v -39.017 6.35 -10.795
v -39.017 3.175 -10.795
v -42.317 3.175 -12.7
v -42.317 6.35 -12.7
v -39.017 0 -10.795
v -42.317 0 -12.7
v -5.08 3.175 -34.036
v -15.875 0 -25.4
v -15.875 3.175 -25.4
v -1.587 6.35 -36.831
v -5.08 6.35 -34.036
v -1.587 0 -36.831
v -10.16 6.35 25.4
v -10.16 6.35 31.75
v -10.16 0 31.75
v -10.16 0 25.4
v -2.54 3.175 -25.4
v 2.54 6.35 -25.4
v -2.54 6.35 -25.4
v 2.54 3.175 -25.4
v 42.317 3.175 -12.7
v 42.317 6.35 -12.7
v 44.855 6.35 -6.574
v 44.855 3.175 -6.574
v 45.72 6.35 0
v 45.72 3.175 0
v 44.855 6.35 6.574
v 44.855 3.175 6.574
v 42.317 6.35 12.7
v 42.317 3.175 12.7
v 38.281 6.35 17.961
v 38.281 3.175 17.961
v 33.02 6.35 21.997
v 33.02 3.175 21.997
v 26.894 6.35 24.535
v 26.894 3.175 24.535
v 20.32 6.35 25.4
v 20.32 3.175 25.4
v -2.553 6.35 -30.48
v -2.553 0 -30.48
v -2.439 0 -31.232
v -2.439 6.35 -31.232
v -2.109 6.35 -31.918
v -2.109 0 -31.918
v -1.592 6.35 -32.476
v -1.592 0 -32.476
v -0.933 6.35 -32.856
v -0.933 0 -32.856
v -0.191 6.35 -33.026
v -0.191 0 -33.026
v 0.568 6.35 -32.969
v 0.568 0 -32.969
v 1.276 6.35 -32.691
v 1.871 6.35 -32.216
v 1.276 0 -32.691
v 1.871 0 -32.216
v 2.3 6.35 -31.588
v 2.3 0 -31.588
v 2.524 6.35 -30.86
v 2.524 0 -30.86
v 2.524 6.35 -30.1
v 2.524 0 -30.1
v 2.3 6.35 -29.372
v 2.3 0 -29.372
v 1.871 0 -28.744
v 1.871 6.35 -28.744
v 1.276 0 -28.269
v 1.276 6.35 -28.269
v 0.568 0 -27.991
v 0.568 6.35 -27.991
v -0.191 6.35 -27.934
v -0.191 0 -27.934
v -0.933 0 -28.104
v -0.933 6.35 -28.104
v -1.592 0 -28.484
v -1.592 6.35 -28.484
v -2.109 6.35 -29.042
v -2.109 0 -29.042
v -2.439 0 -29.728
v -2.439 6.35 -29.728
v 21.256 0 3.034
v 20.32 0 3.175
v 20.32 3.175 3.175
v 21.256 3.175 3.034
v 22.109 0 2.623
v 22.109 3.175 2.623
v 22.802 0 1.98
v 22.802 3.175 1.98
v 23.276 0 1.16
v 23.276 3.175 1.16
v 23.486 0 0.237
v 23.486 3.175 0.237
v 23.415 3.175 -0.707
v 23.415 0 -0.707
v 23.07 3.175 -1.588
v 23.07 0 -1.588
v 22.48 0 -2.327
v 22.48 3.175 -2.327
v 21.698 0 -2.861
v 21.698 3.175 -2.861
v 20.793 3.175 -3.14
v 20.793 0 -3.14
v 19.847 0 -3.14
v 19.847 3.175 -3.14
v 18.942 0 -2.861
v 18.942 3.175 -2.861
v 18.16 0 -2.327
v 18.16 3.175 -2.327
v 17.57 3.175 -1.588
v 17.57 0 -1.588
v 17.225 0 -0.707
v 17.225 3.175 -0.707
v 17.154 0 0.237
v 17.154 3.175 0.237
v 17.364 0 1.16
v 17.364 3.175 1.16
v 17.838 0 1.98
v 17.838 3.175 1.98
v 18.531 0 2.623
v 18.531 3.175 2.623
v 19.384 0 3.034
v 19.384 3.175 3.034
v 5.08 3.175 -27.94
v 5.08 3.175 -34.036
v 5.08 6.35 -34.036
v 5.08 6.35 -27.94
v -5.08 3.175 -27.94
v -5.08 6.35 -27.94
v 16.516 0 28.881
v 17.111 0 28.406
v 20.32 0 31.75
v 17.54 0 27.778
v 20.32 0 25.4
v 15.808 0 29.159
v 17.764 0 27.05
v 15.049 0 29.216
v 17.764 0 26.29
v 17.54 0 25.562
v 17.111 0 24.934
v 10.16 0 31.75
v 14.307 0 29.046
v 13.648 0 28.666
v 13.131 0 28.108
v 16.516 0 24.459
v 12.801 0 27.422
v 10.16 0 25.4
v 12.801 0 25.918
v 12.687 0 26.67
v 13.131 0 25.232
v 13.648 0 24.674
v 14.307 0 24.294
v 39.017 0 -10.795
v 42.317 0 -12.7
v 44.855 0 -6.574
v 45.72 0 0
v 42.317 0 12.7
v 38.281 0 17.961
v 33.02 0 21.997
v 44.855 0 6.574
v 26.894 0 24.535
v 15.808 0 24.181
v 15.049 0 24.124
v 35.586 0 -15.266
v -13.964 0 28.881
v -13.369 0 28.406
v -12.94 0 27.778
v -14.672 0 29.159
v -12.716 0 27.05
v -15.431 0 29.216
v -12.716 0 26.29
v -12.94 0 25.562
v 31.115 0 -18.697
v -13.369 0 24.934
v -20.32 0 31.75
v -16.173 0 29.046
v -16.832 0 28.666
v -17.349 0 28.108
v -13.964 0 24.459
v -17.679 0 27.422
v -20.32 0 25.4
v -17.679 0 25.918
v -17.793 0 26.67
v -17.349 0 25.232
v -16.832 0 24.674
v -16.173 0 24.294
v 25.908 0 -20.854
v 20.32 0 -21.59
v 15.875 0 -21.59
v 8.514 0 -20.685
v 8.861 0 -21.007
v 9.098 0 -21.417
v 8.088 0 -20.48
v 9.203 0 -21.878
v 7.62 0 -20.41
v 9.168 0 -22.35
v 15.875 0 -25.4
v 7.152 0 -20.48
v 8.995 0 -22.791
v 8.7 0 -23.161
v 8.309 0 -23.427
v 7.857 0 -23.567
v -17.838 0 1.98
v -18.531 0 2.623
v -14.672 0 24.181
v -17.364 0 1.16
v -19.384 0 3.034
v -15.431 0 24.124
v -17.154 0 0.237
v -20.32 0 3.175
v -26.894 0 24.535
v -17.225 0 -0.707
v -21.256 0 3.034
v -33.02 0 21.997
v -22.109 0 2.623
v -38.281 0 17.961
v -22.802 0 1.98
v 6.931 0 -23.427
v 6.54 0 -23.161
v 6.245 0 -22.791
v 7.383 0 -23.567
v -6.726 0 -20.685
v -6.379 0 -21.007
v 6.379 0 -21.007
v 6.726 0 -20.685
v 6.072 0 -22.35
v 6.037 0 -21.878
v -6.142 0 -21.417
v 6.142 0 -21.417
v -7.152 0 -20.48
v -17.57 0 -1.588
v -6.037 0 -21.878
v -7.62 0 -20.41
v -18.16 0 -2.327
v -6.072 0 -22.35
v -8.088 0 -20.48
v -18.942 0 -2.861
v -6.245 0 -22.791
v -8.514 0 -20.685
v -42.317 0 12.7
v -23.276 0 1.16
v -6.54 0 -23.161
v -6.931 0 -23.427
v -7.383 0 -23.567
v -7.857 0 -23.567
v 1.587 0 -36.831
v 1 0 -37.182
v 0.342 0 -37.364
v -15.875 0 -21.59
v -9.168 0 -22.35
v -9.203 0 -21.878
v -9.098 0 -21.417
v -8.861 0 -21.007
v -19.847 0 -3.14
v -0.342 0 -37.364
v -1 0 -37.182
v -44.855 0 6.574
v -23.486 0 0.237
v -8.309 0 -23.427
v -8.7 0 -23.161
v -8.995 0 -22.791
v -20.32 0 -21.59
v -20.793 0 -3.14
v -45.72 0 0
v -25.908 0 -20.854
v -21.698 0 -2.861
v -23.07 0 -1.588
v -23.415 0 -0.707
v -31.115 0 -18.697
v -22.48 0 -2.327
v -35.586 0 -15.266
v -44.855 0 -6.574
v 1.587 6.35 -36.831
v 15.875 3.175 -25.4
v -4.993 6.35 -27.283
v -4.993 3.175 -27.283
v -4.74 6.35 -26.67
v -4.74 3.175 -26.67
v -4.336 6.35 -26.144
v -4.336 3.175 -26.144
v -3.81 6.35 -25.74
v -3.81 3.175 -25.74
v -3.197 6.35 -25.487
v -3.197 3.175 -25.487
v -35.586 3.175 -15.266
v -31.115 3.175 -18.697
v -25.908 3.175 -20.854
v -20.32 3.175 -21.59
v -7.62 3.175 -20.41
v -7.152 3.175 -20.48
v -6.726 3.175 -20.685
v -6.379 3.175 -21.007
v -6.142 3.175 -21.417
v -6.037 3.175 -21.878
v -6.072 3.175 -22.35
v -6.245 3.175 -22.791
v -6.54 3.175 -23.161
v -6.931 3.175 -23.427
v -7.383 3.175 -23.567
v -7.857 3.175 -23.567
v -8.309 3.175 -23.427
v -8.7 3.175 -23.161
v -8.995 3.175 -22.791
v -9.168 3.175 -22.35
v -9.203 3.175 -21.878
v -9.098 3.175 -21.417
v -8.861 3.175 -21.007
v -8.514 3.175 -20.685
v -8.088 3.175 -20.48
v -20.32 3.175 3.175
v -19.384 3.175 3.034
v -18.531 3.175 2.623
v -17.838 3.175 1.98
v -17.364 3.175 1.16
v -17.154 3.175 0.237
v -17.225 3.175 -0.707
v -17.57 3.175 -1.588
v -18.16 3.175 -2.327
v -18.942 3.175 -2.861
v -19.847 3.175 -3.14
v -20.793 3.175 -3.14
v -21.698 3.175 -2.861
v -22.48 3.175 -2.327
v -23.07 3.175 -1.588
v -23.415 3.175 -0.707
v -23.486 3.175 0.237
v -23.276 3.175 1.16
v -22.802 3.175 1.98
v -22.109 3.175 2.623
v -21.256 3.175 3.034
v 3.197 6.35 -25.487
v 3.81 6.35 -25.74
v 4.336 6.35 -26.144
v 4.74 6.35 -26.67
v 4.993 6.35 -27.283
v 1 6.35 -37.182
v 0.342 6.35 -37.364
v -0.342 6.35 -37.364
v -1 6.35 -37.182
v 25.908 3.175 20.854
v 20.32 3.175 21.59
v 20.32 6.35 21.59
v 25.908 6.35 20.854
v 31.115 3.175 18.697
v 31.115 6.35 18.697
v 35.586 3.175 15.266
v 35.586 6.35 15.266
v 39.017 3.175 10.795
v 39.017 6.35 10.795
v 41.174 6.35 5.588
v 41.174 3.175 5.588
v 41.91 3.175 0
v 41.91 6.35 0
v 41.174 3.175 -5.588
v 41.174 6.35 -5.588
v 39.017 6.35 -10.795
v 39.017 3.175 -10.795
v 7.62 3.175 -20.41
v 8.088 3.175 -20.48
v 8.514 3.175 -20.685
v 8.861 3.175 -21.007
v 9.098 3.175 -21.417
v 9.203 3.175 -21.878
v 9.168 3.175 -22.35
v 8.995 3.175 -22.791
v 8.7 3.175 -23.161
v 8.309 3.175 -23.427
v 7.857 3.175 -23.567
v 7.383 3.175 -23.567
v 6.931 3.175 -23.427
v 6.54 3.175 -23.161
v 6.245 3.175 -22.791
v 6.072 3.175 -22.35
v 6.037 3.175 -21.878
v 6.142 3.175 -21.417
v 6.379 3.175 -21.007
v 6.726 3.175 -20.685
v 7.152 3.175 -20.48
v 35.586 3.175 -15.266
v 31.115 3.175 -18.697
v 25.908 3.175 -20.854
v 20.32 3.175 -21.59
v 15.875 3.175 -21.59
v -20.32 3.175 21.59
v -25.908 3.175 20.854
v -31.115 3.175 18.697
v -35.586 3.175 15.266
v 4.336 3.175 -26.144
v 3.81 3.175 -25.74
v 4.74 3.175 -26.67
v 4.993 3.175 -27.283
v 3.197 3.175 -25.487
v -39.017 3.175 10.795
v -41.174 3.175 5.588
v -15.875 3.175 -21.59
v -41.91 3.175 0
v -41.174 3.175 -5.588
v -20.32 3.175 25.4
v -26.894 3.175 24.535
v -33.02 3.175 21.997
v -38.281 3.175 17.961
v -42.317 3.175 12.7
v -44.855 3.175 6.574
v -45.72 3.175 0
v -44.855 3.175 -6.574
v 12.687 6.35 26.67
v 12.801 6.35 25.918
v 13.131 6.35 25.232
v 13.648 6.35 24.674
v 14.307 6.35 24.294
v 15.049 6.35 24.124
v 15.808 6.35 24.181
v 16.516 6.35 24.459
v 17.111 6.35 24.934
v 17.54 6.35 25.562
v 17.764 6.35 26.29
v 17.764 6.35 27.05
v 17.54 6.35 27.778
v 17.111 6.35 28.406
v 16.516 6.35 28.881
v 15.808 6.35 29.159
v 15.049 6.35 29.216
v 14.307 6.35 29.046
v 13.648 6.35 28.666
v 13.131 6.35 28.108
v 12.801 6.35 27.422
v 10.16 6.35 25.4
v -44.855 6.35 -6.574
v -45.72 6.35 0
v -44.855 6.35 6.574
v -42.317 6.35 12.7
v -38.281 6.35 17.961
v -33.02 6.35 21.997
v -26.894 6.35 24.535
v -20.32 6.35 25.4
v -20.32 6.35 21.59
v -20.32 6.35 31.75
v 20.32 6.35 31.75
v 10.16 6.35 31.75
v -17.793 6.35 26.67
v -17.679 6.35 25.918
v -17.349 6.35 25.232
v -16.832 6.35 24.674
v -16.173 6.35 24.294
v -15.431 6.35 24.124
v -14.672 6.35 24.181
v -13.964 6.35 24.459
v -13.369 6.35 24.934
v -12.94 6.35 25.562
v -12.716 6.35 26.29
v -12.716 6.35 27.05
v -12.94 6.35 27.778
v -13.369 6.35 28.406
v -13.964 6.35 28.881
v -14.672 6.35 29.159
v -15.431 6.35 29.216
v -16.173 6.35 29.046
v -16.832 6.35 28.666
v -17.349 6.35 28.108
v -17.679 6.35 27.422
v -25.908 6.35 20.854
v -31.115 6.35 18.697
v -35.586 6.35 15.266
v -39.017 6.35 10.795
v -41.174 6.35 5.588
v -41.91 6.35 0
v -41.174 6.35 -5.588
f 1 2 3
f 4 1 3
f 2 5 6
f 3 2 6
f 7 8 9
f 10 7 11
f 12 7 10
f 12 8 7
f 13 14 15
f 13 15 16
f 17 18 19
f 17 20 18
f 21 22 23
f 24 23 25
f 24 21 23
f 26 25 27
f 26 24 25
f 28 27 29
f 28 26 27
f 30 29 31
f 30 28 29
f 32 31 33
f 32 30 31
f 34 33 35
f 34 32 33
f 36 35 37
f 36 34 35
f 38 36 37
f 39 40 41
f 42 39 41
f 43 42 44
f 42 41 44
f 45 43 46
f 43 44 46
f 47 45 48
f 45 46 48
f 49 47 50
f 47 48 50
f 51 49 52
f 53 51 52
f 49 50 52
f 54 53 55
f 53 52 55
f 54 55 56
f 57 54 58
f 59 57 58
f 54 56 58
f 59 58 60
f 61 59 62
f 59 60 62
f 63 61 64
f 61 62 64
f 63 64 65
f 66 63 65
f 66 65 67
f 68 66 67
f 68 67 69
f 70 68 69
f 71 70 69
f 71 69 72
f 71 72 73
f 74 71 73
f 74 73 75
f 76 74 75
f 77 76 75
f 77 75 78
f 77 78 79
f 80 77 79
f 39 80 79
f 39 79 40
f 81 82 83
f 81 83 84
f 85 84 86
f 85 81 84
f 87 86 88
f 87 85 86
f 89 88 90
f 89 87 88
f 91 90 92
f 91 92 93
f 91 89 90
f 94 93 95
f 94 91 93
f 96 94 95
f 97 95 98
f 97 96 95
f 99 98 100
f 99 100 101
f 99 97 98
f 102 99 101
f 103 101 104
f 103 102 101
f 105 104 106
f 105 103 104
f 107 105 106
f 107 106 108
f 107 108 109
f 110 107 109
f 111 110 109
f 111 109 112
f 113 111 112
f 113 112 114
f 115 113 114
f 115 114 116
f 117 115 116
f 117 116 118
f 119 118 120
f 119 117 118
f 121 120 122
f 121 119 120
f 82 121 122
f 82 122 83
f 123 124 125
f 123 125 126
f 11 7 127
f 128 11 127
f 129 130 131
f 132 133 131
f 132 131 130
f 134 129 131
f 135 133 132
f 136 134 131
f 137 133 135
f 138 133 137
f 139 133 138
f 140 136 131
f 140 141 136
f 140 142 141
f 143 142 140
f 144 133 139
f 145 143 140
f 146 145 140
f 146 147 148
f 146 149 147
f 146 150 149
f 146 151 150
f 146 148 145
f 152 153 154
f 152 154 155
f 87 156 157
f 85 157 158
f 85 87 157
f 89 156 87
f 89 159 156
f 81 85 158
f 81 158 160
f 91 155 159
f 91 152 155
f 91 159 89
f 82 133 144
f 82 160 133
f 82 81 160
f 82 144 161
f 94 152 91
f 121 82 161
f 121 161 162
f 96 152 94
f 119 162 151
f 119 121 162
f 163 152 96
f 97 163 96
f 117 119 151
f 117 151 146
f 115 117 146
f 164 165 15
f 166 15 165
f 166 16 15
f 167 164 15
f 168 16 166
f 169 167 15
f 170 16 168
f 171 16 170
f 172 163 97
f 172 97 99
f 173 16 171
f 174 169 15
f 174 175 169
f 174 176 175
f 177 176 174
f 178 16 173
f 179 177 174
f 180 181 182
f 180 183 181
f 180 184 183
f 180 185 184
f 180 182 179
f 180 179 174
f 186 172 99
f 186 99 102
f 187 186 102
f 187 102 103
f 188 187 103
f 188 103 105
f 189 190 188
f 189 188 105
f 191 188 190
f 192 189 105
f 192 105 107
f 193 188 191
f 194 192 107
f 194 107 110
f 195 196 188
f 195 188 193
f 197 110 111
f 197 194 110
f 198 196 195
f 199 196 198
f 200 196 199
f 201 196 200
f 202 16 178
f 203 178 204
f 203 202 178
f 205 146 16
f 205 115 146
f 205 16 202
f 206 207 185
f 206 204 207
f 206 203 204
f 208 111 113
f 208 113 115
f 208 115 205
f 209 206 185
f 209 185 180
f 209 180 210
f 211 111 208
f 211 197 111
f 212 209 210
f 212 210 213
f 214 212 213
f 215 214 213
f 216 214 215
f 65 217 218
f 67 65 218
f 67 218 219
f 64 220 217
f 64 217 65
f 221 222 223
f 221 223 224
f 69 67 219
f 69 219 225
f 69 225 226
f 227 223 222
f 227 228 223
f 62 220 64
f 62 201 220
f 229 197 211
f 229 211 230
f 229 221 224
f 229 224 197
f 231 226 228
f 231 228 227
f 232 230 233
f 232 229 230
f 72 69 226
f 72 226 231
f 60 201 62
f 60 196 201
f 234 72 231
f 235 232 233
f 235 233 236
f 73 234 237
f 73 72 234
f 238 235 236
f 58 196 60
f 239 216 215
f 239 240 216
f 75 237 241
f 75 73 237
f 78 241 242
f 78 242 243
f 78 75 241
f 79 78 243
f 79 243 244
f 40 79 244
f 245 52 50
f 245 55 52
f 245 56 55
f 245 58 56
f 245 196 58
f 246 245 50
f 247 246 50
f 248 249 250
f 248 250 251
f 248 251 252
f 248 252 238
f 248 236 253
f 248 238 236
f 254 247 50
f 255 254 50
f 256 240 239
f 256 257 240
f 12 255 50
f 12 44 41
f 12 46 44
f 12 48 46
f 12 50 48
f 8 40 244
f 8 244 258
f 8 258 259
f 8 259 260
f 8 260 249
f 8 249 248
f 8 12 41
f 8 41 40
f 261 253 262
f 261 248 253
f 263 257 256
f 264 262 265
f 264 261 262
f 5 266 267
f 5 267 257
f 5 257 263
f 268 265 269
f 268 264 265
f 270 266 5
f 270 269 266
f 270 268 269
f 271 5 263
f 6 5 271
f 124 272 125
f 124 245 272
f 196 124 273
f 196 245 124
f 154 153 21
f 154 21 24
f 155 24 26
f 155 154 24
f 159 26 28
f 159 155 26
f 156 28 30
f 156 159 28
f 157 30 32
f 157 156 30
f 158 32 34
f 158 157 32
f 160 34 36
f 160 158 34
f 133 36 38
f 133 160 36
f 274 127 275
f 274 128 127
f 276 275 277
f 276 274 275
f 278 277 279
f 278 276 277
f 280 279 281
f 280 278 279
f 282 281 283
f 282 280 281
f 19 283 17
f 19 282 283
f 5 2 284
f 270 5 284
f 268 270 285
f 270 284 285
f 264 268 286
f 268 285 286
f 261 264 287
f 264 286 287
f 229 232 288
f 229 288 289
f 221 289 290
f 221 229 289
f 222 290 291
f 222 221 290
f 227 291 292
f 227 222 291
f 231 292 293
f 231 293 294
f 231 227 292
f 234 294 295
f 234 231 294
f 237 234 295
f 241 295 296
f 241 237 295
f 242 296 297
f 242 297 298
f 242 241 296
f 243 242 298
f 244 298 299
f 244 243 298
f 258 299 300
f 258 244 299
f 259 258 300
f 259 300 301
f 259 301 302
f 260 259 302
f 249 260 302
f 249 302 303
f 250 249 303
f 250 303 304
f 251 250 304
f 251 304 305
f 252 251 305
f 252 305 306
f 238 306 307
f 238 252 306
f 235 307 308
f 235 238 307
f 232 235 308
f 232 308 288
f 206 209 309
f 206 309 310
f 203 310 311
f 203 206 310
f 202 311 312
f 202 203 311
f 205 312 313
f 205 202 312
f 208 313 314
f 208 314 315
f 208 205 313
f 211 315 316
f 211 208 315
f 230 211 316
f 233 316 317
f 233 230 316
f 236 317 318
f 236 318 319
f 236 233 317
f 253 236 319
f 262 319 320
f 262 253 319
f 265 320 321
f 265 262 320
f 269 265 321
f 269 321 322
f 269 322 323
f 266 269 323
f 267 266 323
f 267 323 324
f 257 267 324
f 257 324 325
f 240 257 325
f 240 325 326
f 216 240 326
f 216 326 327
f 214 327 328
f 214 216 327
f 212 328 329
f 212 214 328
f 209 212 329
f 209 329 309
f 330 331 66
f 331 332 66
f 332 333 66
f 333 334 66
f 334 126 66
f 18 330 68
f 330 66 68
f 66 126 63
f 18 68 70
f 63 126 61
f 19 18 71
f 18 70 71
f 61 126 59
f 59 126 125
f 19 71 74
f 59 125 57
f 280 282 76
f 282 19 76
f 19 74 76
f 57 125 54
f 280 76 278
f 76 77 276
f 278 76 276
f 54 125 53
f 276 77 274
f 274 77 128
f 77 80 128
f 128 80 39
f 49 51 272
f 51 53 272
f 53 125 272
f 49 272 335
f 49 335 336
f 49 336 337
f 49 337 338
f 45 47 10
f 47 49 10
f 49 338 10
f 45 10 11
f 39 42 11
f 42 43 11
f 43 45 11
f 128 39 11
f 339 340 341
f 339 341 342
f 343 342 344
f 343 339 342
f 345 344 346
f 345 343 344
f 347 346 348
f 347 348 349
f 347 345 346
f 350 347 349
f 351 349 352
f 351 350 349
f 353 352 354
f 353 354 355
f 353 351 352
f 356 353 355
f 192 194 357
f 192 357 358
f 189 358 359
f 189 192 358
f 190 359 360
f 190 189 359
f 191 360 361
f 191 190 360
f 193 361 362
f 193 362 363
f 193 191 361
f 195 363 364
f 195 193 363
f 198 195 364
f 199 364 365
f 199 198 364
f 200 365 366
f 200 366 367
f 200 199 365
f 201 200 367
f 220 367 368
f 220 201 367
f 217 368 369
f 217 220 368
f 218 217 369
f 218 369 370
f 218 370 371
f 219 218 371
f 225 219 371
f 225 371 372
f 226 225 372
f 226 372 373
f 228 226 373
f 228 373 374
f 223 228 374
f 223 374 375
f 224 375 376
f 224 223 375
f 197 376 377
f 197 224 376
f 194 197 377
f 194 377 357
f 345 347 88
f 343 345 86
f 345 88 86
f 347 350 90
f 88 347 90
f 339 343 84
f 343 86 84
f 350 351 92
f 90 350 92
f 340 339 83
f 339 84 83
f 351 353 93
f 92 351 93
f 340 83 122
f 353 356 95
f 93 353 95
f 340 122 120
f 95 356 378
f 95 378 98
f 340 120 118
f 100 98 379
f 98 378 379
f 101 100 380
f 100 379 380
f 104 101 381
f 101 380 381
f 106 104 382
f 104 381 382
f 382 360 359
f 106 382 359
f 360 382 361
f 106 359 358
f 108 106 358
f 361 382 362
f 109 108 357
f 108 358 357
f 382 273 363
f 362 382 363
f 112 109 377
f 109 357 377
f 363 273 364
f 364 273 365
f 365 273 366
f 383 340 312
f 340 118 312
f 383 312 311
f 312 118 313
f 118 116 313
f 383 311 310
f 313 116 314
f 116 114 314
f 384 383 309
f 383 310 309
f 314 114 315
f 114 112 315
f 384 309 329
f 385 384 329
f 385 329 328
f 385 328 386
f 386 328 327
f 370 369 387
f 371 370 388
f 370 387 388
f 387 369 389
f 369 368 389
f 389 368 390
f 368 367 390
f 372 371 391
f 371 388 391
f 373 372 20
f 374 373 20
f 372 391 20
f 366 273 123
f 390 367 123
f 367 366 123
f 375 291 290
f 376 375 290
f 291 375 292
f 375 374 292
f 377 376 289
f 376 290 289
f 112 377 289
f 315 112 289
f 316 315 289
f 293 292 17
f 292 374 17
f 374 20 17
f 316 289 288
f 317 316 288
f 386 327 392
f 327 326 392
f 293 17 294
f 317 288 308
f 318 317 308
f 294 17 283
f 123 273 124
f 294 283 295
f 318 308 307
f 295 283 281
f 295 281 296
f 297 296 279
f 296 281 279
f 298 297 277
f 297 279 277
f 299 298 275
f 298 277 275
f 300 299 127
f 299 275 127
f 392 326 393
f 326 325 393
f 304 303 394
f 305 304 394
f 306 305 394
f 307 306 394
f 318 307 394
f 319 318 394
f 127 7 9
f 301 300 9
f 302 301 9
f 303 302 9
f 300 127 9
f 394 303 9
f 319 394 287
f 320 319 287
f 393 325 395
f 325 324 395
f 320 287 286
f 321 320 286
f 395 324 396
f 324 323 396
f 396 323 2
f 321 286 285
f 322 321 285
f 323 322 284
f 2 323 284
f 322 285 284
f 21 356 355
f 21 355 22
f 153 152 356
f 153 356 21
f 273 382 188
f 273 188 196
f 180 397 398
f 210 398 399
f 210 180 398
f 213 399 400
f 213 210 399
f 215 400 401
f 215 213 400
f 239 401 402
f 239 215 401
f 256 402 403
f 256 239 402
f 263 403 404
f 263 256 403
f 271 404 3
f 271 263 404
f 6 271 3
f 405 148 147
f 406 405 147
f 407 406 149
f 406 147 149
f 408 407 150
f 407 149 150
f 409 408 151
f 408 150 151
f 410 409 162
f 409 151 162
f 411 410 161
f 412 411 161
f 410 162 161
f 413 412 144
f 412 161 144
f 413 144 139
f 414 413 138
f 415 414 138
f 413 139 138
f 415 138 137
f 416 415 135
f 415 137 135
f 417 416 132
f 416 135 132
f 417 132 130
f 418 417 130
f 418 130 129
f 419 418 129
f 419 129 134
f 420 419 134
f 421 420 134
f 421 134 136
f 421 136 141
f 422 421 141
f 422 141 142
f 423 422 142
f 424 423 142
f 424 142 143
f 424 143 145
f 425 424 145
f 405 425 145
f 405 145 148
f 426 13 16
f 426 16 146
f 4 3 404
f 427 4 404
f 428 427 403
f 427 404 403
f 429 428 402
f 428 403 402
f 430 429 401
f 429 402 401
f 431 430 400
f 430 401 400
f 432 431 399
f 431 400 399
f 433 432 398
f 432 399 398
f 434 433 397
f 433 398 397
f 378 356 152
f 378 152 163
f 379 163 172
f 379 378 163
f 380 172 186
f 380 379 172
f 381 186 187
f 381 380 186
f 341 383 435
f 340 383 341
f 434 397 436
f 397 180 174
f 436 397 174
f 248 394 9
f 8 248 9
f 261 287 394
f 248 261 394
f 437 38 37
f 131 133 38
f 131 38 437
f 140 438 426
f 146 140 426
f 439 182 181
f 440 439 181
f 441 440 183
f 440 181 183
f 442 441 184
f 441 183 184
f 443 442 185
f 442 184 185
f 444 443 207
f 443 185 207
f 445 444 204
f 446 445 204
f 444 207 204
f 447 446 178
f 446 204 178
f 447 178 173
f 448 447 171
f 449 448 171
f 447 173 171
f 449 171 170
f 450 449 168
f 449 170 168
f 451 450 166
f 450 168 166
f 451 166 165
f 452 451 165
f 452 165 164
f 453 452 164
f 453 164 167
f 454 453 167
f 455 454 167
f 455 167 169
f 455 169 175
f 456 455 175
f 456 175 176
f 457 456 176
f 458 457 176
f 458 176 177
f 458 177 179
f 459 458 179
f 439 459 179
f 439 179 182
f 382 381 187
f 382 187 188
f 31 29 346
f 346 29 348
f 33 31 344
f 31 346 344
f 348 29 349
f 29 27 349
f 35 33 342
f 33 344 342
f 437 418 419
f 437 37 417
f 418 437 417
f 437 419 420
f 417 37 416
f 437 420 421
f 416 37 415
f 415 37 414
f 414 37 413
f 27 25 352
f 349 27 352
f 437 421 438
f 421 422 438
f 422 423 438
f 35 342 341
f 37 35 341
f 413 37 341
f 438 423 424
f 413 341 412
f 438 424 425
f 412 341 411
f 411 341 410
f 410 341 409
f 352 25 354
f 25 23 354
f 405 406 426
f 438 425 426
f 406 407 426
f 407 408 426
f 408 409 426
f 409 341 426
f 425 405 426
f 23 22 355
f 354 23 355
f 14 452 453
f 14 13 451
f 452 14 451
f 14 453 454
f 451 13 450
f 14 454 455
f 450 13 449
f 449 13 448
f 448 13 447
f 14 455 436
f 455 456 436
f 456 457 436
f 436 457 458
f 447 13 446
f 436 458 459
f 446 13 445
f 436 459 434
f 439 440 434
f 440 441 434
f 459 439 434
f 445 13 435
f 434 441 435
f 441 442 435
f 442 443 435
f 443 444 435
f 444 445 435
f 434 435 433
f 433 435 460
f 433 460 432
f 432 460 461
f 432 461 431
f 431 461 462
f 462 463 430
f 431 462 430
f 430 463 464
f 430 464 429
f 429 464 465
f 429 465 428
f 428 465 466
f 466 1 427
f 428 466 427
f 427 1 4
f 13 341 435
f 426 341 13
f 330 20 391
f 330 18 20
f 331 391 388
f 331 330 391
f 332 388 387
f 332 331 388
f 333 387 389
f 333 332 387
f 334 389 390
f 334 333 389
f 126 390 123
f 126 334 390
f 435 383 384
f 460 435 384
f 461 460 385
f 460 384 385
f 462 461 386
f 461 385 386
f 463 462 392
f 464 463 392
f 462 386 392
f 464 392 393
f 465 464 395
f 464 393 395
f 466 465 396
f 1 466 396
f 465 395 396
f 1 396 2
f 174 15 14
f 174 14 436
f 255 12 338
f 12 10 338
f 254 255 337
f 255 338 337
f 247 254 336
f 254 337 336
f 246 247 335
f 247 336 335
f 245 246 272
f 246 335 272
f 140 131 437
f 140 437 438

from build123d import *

# Parameters (mm, degrees)
SKETCH1_R                    = 3.175
SKETCH1_R_2                  = 1.5875
BOSS_EXTRUDE1_DEPTH          = 3.175
CUT_EXTRUDE1_REACH           = 61.599
BOSS_EXTRUDE2_DEPTH          = 3.175
TAP_DRILL_FOR_10_HELICOIL2_D = 5.1054
FILLET1_R                    = 2.54
CUT_EXTRUDE2_REACH           = 61.146
SKETCH20_W                   = 20.32
SKETCH20_H                   = 6.35


with BuildPart() as part:
    # Sketch1 → Boss-Extrude1 (new body)
    with BuildSketch(Plane(origin=(0, 0, 0), x_dir=(1, 0, 0), z_dir=(0, 1, 0))):
        with BuildLine():
            Line((-20.32, 25.4), (-15.875, 25.4))
            Line((-15.875, 25.4), (0, 38.1))
            Line((0, 38.1), (15.875, 25.4))
            Line((15.875, 25.4), (20.32, 25.4))
            ThreePointArc((20.32, 25.4), (45.72, 0), (20.32, -25.4))
            Line((20.32, -25.4), (20.32, -31.75))
            Line((20.32, -31.75), (-20.32, -31.75))
            Line((-20.32, -31.75), (-20.32, -25.4))
            ThreePointArc((-20.32, -25.4), (-45.72, 0), (-20.32, 25.4))
        make_face()
        with Locations(Location((20.32, 0, 0), (0, 0, 270))):
            Circle(SKETCH1_R, mode=Mode.SUBTRACT)
        with Locations(Location((7.62, 21.997045256, 0), (0, 0, 270))):
            Circle(SKETCH1_R_2, mode=Mode.SUBTRACT)
        with Locations(Location((-20.32, 0, 0), (0, 0, 270))):
            Circle(SKETCH1_R, mode=Mode.SUBTRACT)
        with Locations(Location((-7.62, 21.997045256, 0), (0, 0, 270))):
            Circle(SKETCH1_R_2, mode=Mode.SUBTRACT)
    extrude(amount=BOSS_EXTRUDE1_DEPTH)

    # Sketch7 → Cut-Extrude1 (cut, up to next)
    with BuildSketch(Plane(origin=(0, 3.175, 0), x_dir=(1, 0, 0), z_dir=(0, 1, 0)), mode=Mode.PRIVATE) as cut_extrude1_sk1:
        with BuildLine():
            Line((-42.317045256, 12.7), (-39.017488468, 10.795))
            ThreePointArc((-39.017488468, 10.795), (-31.115, 18.697488468), (-20.32, 21.59))
            Line((-20.32, 21.59), (-15.875, 21.59))
            Line((-15.875, 21.59), (-15.875, 25.008038208))
            ThreePointArc((-15.875, 25.008038208), (-18.088875897, 25.301819801), (-20.32, 25.4))
            ThreePointArc((-20.32, 25.4), (-33.02, 21.997045256), (-42.317045256, 12.7))
        make_face()
    cut_extrude1_tool1 = extrude(cut_extrude1_sk1.sketch, amount=-CUT_EXTRUDE1_REACH, mode=Mode.PRIVATE) & part.part
    # Sketch7 → Cut-Extrude1 (cut, up to next)
    with BuildSketch(Plane(origin=(0, 3.175, 0), x_dir=(1, 0, 0), z_dir=(0, 1, 0)), mode=Mode.PRIVATE) as cut_extrude1_sk2:
        with BuildLine():
            Line((-15.875, 25.4), (-20.32, 25.4))
            ThreePointArc((-20.32, 25.4), (-18.088875897, 25.301819801), (-15.875, 25.008038208))
            Line((-15.875, 25.008038208), (-15.875, 25.4))
        make_face()
    cut_extrude1_tool2 = extrude(cut_extrude1_sk2.sketch, amount=-CUT_EXTRUDE1_REACH, mode=Mode.PRIVATE) & part.part
    cut_extrude1_1 = cut_extrude1_tool1.solids().sort_by_distance((-29.568041, 3.175, -20.060943))[0]
    add(cut_extrude1_1, mode=Mode.SUBTRACT)
    cut_extrude1_2 = cut_extrude1_tool2.solids().sort_by_distance((-16.984528, 3.175, -25.282569))[0]
    add(cut_extrude1_2, mode=Mode.SUBTRACT)
    cut_extrude1 = cut_extrude1_1 + cut_extrude1_2  # Cut-Extrude1 as one shape, for the pattern or mirror that repeats it

    # Sketch9 → Boss-Extrude2 (add)
    with BuildSketch(Plane(origin=(0, 3.175, 0), x_dir=(1, 0, 0), z_dir=(0, 1, 0))):
        with BuildLine():
            Line((-39.017488468, 10.795), (-42.317045256, 12.7))
            ThreePointArc((-42.317045256, 12.7), (-42.317045256, -12.7), (-20.32, -25.4))
            Line((-20.32, -25.4), (-20.32, -31.75))
            Line((-20.32, -31.75), (-10.16, -31.75))
            Line((-10.16, -31.75), (-10.16, -25.4))
            Line((-10.16, -25.4), (0, -25.4))
            Line((0, -25.4), (0, -21.59))
            Line((0, -21.59), (-20.32, -21.59))
            ThreePointArc((-20.32, -21.59), (-39.017488468, -10.795), (-39.017488468, 10.795))
        make_face()
        Polygon((0, 38.1), (-5.08, 34.036), (-5.08, 25.4), (0, 25.4), align=None)
    boss_extrude2 = extrude(amount=BOSS_EXTRUDE2_DEPTH)

    # Mirror1: Cut-Extrude1, Boss-Extrude2 across plane
    add(cut_extrude1.mirror(Plane(origin=(0, 0, 0), x_dir=(0, 0, 1), z_dir=(1, 0, 0))), mode=Mode.SUBTRACT)
    add(boss_extrude2.mirror(Plane(origin=(0, 0, 0), x_dir=(0, 0, 1), z_dir=(1, 0, 0))))

    # Tap Drill for #10 Helicoil2 (through all)
    with Locations(Plane(origin=(0, 6.35, 0), x_dir=(1, 0, 0), z_dir=(0, 1, 0))):
        with Locations((-15.24, -26.67), (15.24, -26.67), (0, 30.48)):
            Hole(TAP_DRILL_FOR_10_HELICOIL2_D / 2)

    # Fillet1
    fillet1_edges = [part.edges().sort_by_distance(p)[0] for p in [
        (5.08, 4.7625, -25.4),
        (0, 3.175, -38.1),
        (-5.08, 4.7625, -25.4),
    ]]
    fillet(fillet1_edges, radius=FILLET1_R)

    # Sketch20 → Cut-Extrude2 (cut, up to next)
    with BuildSketch(Plane(origin=(0, 3.175, 0), x_dir=(1, 0, 0), z_dir=(0, 1, 0)), mode=Mode.PRIVATE) as cut_extrude2_sk1:
        with Locations((0, -28.575)):
            Rectangle(SKETCH20_W, SKETCH20_H)
    cut_extrude2_tool1 = extrude(cut_extrude2_sk1.sketch, amount=-CUT_EXTRUDE2_REACH, mode=Mode.PRIVATE) & part.part
    add(cut_extrude2_tool1.solids().sort_by_distance((0, 3.175, 28.575))[0], mode=Mode.SUBTRACT)


solid = part.part
